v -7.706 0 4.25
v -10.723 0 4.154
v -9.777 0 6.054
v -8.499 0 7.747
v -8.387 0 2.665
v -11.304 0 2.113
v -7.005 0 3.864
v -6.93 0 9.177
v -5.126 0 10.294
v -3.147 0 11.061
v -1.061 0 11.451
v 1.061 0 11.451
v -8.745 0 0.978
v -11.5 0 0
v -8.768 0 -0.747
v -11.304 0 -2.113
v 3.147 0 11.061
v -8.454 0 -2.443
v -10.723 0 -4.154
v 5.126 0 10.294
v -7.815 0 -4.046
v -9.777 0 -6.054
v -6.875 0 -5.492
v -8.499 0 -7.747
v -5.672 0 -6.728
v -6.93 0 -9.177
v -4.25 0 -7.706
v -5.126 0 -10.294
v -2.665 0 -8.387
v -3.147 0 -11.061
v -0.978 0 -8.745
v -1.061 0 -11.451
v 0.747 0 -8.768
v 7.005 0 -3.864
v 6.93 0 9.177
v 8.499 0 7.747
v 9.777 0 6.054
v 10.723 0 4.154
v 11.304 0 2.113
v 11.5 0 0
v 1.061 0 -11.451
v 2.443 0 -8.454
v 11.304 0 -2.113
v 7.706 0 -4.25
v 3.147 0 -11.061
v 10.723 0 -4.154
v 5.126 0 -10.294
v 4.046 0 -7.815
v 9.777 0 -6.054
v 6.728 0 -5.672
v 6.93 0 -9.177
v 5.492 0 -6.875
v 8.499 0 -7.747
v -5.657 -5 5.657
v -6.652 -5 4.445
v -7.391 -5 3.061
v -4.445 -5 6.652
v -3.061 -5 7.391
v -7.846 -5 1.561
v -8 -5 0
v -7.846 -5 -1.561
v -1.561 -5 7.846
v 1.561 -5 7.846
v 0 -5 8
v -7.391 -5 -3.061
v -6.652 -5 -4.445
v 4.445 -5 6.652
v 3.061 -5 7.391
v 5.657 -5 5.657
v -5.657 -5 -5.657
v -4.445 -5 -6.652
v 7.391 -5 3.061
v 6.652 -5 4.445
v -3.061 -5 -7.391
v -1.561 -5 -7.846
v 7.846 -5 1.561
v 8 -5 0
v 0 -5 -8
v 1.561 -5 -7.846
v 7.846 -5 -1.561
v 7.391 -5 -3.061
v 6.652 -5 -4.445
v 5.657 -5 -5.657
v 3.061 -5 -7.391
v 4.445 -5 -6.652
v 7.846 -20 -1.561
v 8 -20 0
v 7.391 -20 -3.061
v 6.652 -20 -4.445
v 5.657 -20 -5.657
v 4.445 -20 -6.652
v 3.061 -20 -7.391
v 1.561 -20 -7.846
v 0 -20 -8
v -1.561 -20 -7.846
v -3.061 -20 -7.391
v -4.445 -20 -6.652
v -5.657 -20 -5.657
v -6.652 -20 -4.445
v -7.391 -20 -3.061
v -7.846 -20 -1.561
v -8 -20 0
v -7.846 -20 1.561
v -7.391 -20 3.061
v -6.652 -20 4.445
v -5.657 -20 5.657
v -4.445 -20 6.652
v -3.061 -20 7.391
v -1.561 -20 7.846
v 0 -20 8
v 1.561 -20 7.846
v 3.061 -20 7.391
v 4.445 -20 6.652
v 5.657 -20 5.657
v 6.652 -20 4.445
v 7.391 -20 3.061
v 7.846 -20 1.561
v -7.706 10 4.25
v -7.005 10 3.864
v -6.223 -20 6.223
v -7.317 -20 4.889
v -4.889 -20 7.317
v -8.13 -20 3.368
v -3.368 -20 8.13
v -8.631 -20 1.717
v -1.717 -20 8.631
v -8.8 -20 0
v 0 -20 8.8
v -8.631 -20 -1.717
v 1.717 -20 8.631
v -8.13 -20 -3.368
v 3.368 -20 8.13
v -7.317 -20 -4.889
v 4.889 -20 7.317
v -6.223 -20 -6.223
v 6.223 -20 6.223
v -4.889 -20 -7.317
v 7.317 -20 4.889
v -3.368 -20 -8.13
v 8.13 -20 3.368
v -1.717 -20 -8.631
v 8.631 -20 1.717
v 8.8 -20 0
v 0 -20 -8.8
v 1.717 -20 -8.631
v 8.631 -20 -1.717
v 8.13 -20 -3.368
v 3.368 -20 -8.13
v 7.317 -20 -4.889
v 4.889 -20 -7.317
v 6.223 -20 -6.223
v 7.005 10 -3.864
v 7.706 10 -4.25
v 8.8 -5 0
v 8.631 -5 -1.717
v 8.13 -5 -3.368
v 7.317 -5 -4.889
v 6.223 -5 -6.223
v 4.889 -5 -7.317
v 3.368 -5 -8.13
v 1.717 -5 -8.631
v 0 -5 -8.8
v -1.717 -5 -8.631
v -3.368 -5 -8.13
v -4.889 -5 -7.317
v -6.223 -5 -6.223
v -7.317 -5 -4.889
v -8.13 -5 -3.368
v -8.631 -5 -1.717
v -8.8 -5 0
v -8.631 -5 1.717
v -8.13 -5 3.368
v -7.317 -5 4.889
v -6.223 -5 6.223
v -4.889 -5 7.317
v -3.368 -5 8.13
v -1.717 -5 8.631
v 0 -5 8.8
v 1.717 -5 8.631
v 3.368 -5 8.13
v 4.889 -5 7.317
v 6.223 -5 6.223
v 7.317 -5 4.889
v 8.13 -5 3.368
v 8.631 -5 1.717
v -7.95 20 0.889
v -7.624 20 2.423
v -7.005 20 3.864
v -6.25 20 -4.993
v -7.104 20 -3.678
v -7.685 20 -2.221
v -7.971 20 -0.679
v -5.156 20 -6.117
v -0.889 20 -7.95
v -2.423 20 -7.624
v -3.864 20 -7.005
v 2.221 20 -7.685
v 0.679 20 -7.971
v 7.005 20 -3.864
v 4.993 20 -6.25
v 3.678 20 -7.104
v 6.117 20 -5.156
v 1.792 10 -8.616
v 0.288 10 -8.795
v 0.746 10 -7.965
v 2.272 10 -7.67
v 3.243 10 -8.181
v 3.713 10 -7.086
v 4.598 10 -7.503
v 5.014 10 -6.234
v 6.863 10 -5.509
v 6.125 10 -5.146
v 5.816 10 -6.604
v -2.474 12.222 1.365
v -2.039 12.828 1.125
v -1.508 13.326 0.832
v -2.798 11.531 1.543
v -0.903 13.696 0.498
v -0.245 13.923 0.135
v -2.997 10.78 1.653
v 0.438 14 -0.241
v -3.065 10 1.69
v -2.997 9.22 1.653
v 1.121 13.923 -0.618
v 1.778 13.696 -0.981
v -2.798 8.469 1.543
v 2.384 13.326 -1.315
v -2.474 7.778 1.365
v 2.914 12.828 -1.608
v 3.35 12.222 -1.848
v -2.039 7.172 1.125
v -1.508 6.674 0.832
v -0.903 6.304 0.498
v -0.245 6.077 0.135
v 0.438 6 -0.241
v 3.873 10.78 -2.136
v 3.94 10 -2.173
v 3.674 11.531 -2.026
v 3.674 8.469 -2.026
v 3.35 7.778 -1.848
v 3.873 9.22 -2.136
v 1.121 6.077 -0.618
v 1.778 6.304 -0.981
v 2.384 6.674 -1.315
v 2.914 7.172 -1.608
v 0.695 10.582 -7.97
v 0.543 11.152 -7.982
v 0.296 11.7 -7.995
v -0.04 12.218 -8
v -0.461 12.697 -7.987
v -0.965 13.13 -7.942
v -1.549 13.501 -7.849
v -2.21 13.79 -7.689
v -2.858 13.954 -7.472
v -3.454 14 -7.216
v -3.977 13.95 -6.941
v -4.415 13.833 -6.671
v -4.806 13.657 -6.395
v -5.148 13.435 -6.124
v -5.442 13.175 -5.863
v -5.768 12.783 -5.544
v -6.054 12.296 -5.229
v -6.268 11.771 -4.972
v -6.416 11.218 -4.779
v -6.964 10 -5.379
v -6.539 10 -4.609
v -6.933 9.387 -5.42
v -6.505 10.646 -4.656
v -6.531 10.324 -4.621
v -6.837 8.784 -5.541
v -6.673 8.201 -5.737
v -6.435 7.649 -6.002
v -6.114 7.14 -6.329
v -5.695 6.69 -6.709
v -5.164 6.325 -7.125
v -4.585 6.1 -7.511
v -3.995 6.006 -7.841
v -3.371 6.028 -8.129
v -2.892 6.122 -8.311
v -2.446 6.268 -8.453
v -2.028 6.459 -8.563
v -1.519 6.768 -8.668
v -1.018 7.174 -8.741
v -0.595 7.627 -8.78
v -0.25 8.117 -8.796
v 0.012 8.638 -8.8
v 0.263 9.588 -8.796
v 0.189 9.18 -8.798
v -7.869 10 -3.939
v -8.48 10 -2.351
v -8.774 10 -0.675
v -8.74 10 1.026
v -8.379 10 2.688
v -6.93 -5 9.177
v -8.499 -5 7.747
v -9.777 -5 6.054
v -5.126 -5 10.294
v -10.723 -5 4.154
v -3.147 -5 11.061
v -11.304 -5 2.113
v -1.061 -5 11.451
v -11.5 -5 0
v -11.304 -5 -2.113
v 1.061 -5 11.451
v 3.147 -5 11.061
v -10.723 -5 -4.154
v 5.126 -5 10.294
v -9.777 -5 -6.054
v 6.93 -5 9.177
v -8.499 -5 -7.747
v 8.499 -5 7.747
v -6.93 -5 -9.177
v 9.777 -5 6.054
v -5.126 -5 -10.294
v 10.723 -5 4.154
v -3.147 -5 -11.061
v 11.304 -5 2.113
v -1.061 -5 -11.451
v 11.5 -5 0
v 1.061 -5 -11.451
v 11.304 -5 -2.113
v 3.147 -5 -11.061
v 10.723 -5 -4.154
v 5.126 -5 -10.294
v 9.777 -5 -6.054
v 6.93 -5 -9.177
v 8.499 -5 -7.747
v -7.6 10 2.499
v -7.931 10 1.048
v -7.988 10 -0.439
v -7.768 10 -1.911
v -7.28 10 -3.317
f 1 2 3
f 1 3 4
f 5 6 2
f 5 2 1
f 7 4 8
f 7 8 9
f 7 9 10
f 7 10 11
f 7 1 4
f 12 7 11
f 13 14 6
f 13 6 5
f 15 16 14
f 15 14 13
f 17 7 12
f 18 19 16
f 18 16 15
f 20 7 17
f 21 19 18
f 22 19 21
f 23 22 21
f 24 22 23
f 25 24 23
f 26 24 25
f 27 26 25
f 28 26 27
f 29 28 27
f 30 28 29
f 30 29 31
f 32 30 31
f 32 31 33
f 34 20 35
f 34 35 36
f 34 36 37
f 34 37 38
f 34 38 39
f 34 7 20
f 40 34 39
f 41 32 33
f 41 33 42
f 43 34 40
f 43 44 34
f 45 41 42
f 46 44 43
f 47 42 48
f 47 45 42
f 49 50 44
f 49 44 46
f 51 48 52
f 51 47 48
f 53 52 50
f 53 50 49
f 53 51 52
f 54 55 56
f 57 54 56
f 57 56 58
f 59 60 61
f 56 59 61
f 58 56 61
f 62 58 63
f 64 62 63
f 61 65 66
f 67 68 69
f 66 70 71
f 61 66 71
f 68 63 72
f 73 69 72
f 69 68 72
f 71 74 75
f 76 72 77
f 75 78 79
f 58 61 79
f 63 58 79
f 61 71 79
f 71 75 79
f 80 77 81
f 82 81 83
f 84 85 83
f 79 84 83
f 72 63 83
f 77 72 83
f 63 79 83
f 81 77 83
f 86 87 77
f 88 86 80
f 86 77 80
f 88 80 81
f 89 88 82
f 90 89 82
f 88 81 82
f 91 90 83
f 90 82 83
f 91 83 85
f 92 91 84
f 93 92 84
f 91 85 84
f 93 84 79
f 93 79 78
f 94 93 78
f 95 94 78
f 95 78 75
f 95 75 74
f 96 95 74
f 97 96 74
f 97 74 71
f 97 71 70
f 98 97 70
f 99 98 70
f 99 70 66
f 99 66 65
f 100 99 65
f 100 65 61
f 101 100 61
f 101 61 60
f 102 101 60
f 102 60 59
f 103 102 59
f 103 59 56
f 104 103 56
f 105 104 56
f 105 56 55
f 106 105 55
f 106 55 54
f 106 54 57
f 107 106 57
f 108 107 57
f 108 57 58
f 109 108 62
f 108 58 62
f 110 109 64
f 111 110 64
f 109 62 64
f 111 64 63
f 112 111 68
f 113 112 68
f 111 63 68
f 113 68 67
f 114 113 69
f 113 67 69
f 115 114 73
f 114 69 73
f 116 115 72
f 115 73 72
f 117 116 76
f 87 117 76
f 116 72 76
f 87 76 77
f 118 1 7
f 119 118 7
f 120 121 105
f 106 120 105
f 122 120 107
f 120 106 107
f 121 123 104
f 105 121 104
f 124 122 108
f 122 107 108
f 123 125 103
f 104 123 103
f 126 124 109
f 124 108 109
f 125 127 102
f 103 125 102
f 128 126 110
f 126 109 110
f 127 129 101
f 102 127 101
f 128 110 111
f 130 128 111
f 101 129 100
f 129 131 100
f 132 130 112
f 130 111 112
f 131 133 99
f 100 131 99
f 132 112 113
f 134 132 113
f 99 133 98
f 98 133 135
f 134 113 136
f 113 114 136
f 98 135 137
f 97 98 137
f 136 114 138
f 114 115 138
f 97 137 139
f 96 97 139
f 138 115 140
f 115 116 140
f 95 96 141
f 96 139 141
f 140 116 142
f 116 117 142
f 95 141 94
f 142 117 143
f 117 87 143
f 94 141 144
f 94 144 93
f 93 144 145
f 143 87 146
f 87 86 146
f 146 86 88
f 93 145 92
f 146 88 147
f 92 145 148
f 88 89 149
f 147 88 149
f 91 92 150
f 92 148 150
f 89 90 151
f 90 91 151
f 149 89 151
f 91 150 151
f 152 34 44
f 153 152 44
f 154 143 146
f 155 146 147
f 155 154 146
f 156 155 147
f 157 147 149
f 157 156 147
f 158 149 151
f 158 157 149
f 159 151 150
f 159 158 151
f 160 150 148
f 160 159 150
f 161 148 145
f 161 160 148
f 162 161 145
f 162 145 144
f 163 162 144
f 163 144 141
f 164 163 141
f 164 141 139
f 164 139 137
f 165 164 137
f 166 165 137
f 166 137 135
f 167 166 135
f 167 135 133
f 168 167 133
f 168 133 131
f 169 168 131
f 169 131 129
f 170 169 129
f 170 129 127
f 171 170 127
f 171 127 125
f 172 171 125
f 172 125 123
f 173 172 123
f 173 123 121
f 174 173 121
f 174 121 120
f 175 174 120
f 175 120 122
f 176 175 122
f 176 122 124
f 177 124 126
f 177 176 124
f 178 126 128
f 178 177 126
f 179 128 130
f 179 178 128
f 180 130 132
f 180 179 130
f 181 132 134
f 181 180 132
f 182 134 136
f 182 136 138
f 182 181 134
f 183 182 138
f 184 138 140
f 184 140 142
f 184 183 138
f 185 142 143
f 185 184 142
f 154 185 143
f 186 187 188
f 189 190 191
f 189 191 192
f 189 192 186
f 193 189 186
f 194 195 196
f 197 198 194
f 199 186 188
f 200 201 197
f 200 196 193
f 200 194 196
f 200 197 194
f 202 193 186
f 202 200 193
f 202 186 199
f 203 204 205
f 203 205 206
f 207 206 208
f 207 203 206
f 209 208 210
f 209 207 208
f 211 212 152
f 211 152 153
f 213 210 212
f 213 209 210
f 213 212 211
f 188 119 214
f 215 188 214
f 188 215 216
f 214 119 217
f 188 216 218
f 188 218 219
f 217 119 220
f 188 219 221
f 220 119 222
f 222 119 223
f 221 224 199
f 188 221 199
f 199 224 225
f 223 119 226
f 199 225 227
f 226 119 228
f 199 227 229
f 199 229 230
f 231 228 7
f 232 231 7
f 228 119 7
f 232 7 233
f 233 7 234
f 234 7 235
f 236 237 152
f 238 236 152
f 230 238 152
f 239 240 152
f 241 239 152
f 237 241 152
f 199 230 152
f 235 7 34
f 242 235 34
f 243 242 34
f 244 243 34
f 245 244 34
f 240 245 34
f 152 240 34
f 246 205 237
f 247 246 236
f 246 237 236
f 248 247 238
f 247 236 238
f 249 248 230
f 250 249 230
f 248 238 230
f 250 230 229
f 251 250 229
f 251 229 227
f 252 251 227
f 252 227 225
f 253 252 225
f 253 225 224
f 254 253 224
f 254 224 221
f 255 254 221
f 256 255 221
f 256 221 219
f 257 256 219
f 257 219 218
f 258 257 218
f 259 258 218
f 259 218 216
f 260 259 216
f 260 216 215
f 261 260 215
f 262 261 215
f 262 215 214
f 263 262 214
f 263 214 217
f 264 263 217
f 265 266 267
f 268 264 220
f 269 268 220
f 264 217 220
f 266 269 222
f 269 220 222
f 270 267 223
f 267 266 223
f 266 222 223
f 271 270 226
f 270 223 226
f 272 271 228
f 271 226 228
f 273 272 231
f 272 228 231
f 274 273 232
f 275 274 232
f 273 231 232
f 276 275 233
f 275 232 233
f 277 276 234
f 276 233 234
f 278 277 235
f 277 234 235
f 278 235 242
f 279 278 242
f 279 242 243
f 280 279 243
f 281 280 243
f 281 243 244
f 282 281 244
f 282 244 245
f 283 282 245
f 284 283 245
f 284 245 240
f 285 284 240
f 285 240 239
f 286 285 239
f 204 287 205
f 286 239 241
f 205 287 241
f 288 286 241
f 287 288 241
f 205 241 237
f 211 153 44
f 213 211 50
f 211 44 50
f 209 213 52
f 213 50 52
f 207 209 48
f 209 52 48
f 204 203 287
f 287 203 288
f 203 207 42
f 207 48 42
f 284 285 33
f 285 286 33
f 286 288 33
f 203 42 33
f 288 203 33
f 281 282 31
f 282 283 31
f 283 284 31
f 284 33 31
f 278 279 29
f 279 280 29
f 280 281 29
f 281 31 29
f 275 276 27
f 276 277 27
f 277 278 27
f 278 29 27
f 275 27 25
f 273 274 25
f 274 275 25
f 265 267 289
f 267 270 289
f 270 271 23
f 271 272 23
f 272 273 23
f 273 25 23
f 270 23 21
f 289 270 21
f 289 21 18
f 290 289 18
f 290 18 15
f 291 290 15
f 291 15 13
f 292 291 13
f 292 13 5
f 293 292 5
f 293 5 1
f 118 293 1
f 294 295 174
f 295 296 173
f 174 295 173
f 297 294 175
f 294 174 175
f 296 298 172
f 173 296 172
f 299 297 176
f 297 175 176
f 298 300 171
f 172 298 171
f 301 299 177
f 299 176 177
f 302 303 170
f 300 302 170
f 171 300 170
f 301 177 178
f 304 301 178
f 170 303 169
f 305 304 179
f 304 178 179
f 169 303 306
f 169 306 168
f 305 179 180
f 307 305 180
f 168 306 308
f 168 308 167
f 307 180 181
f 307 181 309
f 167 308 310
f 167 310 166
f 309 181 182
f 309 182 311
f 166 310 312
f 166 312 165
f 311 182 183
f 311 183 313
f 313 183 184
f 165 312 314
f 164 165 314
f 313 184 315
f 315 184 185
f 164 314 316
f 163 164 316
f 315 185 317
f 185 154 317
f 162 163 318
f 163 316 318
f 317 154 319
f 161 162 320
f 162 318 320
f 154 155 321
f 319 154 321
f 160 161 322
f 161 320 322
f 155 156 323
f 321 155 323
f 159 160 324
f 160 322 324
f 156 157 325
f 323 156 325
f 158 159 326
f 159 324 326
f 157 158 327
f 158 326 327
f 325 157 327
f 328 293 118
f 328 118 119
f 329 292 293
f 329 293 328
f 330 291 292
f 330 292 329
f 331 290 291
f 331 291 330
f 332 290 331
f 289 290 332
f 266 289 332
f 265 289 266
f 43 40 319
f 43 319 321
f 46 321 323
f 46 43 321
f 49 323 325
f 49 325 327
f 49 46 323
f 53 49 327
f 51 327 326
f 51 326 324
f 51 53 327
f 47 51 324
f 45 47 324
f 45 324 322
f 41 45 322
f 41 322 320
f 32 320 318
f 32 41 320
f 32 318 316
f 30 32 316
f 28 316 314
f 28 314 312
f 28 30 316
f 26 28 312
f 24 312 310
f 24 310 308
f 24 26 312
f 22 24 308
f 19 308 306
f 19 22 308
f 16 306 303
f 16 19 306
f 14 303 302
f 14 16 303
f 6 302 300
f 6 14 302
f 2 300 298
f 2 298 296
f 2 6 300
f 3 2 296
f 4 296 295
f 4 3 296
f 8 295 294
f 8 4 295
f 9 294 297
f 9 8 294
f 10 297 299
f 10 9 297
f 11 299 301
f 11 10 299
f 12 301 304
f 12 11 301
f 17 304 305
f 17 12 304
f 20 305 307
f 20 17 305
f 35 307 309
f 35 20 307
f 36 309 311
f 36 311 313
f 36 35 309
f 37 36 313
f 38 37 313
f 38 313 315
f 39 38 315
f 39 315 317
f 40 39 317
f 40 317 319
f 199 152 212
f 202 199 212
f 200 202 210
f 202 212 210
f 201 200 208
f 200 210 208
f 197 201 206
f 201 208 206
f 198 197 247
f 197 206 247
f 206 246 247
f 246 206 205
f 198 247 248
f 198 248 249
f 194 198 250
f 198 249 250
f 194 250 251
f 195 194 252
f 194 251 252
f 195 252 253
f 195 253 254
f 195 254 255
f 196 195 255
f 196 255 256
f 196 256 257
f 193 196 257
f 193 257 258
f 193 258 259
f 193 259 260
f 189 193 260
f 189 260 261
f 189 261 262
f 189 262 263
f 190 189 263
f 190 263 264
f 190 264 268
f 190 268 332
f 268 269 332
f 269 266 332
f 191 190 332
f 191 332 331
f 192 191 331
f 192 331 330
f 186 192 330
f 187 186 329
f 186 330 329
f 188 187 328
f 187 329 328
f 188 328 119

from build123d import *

# Parameters (mm, degrees)
BOSS_EXTRUDE1_DEPTH = 10
SKETCH1_4_R         = 11.5
BOSS_EXTRUDE3_DEPTH = 5
BOSS_EXTRUDE4_DEPTH = 5
BOSS_EXTRUDE5_DEPTH = 20
SKETCH1_8_R         = 11.5
SKETCH1_8_R_2       = 8.8
SKETCH1_8_R_3       = 8
BOSS_EXTRUDE6_DEPTH = 5
SKETCH1_10_R        = 8.8
SKETCH1_10_R_2      = 8
BOSS_EXTRUDE8_DEPTH = 20
SKETCH8_R           = 4
CUT_EXTRUDE2_DEPTH  = 20


with BuildPart() as part:
    # Sketch1 → Boss-Extrude1 (new body)
    with BuildSketch(Plane(origin=(0, 0, 0), x_dir=(1, 0, 0), z_dir=(0, 1, 0))):
        with BuildLine():
            Line((-7.705545208, -4.250243881), (-7.005041098, -3.863858073))
            ThreePointArc((-7.005041098, -3.863858073), (-3.863858073, 7.005041098), (7.005041098, 3.863858073))
            Line((7.005041098, 3.863858073), (7.705545208, 4.250243881))
            ThreePointArc((7.705545208, 4.250243881), (-4.250243881, 7.705545208), (-7.705545208, -4.250243881))
        make_face()
    extrude(amount=BOSS_EXTRUDE1_DEPTH)

    # Sketch1<4> → Boss-Extrude3 (add)
    with BuildSketch(Plane(origin=(0, 0, 0), x_dir=(1, 0, 0), z_dir=(0, 1, 0))):
        Circle(SKETCH1_4_R)
        with BuildLine():
            Line((-7.705545208, -4.250243881), (-7.005041098, -3.863858073))
            ThreePointArc((-7.005041098, -3.863858073), (3.863858073, -7.005041098), (7.005041098, 3.863858073))
            Line((7.005041098, 3.863858073), (7.705545208, 4.250243881))
            ThreePointArc((7.705545208, 4.250243881), (4.250243881, -7.705545208), (-7.705545208, -4.250243881))
        make_face(mode=Mode.SUBTRACT)
    extrude(amount=-BOSS_EXTRUDE3_DEPTH)

    # Sketch1<6> → Boss-Extrude4 (add)
    with BuildSketch(Plane(origin=(0, 0, 0), x_dir=(1, 0, 0), z_dir=(0, 1, 0))):
        with BuildLine():
            ThreePointArc((8, 0), (1.994952532, -7.747268189), (-7.005041098, -3.863858073))
            Line((-7.005041098, -3.863858073), (-7.705545208, -4.250243881))
            ThreePointArc((-7.705545208, -4.250243881), (2.194447786, -8.521995008), (8.8, 0))
            ThreePointArc((8.8, 0), (8.521995008, 2.194447786), (7.705545208, 4.250243881))
            Line((7.705545208, 4.250243881), (7.005041098, 3.863858073))
            ThreePointArc((7.005041098, 3.863858073), (7.747268189, 1.994952532), (8, 0))
        make_face()
    extrude(amount=-BOSS_EXTRUDE4_DEPTH)

    # Sketch1<7> → Boss-Extrude5 (add)
    with BuildSketch(Plane(origin=(0, 0, 0), x_dir=(1, 0, 0), z_dir=(0, 1, 0))):
        with BuildLine():
            ThreePointArc((7.005041098, 3.863858073), (-3.863858073, 7.005041098), (-7.005041098, -3.863858073))
            Line((-7.005041098, -3.863858073), (7.005041098, 3.863858073))
        make_face()
    extrude(amount=BOSS_EXTRUDE5_DEPTH)

    # Sketch1<8> → Boss-Extrude6 (add)
    with BuildSketch(Plane(origin=(0, 0, 0), x_dir=(1, 0, 0), z_dir=(0, 1, 0))):
        Circle(SKETCH1_8_R)
        Circle(SKETCH1_8_R_2, mode=Mode.SUBTRACT)
        Circle(SKETCH1_8_R_3)
    extrude(amount=-BOSS_EXTRUDE6_DEPTH)

    # Sketch1<10> → Boss-Extrude8 (add)
    with BuildSketch(Plane(origin=(0, 0, 0), x_dir=(1, 0, 0), z_dir=(0, 1, 0))):
        Circle(SKETCH1_10_R)
        Circle(SKETCH1_10_R_2, mode=Mode.SUBTRACT)
    extrude(amount=-BOSS_EXTRUDE8_DEPTH)

    # Sketch8 → Cut-Extrude2 (cut)
    with BuildSketch(Plane(origin=(0, 0, 0), x_dir=(0.875630137, 0, -0.482982259), z_dir=(0.482982259, 0, 0.875630137))):
        with Locations((0.5, 10)):
            Circle(SKETCH8_R)
    extrude(amount=-CUT_EXTRUDE2_DEPTH, mode=Mode.SUBTRACT)


solid = part.part
